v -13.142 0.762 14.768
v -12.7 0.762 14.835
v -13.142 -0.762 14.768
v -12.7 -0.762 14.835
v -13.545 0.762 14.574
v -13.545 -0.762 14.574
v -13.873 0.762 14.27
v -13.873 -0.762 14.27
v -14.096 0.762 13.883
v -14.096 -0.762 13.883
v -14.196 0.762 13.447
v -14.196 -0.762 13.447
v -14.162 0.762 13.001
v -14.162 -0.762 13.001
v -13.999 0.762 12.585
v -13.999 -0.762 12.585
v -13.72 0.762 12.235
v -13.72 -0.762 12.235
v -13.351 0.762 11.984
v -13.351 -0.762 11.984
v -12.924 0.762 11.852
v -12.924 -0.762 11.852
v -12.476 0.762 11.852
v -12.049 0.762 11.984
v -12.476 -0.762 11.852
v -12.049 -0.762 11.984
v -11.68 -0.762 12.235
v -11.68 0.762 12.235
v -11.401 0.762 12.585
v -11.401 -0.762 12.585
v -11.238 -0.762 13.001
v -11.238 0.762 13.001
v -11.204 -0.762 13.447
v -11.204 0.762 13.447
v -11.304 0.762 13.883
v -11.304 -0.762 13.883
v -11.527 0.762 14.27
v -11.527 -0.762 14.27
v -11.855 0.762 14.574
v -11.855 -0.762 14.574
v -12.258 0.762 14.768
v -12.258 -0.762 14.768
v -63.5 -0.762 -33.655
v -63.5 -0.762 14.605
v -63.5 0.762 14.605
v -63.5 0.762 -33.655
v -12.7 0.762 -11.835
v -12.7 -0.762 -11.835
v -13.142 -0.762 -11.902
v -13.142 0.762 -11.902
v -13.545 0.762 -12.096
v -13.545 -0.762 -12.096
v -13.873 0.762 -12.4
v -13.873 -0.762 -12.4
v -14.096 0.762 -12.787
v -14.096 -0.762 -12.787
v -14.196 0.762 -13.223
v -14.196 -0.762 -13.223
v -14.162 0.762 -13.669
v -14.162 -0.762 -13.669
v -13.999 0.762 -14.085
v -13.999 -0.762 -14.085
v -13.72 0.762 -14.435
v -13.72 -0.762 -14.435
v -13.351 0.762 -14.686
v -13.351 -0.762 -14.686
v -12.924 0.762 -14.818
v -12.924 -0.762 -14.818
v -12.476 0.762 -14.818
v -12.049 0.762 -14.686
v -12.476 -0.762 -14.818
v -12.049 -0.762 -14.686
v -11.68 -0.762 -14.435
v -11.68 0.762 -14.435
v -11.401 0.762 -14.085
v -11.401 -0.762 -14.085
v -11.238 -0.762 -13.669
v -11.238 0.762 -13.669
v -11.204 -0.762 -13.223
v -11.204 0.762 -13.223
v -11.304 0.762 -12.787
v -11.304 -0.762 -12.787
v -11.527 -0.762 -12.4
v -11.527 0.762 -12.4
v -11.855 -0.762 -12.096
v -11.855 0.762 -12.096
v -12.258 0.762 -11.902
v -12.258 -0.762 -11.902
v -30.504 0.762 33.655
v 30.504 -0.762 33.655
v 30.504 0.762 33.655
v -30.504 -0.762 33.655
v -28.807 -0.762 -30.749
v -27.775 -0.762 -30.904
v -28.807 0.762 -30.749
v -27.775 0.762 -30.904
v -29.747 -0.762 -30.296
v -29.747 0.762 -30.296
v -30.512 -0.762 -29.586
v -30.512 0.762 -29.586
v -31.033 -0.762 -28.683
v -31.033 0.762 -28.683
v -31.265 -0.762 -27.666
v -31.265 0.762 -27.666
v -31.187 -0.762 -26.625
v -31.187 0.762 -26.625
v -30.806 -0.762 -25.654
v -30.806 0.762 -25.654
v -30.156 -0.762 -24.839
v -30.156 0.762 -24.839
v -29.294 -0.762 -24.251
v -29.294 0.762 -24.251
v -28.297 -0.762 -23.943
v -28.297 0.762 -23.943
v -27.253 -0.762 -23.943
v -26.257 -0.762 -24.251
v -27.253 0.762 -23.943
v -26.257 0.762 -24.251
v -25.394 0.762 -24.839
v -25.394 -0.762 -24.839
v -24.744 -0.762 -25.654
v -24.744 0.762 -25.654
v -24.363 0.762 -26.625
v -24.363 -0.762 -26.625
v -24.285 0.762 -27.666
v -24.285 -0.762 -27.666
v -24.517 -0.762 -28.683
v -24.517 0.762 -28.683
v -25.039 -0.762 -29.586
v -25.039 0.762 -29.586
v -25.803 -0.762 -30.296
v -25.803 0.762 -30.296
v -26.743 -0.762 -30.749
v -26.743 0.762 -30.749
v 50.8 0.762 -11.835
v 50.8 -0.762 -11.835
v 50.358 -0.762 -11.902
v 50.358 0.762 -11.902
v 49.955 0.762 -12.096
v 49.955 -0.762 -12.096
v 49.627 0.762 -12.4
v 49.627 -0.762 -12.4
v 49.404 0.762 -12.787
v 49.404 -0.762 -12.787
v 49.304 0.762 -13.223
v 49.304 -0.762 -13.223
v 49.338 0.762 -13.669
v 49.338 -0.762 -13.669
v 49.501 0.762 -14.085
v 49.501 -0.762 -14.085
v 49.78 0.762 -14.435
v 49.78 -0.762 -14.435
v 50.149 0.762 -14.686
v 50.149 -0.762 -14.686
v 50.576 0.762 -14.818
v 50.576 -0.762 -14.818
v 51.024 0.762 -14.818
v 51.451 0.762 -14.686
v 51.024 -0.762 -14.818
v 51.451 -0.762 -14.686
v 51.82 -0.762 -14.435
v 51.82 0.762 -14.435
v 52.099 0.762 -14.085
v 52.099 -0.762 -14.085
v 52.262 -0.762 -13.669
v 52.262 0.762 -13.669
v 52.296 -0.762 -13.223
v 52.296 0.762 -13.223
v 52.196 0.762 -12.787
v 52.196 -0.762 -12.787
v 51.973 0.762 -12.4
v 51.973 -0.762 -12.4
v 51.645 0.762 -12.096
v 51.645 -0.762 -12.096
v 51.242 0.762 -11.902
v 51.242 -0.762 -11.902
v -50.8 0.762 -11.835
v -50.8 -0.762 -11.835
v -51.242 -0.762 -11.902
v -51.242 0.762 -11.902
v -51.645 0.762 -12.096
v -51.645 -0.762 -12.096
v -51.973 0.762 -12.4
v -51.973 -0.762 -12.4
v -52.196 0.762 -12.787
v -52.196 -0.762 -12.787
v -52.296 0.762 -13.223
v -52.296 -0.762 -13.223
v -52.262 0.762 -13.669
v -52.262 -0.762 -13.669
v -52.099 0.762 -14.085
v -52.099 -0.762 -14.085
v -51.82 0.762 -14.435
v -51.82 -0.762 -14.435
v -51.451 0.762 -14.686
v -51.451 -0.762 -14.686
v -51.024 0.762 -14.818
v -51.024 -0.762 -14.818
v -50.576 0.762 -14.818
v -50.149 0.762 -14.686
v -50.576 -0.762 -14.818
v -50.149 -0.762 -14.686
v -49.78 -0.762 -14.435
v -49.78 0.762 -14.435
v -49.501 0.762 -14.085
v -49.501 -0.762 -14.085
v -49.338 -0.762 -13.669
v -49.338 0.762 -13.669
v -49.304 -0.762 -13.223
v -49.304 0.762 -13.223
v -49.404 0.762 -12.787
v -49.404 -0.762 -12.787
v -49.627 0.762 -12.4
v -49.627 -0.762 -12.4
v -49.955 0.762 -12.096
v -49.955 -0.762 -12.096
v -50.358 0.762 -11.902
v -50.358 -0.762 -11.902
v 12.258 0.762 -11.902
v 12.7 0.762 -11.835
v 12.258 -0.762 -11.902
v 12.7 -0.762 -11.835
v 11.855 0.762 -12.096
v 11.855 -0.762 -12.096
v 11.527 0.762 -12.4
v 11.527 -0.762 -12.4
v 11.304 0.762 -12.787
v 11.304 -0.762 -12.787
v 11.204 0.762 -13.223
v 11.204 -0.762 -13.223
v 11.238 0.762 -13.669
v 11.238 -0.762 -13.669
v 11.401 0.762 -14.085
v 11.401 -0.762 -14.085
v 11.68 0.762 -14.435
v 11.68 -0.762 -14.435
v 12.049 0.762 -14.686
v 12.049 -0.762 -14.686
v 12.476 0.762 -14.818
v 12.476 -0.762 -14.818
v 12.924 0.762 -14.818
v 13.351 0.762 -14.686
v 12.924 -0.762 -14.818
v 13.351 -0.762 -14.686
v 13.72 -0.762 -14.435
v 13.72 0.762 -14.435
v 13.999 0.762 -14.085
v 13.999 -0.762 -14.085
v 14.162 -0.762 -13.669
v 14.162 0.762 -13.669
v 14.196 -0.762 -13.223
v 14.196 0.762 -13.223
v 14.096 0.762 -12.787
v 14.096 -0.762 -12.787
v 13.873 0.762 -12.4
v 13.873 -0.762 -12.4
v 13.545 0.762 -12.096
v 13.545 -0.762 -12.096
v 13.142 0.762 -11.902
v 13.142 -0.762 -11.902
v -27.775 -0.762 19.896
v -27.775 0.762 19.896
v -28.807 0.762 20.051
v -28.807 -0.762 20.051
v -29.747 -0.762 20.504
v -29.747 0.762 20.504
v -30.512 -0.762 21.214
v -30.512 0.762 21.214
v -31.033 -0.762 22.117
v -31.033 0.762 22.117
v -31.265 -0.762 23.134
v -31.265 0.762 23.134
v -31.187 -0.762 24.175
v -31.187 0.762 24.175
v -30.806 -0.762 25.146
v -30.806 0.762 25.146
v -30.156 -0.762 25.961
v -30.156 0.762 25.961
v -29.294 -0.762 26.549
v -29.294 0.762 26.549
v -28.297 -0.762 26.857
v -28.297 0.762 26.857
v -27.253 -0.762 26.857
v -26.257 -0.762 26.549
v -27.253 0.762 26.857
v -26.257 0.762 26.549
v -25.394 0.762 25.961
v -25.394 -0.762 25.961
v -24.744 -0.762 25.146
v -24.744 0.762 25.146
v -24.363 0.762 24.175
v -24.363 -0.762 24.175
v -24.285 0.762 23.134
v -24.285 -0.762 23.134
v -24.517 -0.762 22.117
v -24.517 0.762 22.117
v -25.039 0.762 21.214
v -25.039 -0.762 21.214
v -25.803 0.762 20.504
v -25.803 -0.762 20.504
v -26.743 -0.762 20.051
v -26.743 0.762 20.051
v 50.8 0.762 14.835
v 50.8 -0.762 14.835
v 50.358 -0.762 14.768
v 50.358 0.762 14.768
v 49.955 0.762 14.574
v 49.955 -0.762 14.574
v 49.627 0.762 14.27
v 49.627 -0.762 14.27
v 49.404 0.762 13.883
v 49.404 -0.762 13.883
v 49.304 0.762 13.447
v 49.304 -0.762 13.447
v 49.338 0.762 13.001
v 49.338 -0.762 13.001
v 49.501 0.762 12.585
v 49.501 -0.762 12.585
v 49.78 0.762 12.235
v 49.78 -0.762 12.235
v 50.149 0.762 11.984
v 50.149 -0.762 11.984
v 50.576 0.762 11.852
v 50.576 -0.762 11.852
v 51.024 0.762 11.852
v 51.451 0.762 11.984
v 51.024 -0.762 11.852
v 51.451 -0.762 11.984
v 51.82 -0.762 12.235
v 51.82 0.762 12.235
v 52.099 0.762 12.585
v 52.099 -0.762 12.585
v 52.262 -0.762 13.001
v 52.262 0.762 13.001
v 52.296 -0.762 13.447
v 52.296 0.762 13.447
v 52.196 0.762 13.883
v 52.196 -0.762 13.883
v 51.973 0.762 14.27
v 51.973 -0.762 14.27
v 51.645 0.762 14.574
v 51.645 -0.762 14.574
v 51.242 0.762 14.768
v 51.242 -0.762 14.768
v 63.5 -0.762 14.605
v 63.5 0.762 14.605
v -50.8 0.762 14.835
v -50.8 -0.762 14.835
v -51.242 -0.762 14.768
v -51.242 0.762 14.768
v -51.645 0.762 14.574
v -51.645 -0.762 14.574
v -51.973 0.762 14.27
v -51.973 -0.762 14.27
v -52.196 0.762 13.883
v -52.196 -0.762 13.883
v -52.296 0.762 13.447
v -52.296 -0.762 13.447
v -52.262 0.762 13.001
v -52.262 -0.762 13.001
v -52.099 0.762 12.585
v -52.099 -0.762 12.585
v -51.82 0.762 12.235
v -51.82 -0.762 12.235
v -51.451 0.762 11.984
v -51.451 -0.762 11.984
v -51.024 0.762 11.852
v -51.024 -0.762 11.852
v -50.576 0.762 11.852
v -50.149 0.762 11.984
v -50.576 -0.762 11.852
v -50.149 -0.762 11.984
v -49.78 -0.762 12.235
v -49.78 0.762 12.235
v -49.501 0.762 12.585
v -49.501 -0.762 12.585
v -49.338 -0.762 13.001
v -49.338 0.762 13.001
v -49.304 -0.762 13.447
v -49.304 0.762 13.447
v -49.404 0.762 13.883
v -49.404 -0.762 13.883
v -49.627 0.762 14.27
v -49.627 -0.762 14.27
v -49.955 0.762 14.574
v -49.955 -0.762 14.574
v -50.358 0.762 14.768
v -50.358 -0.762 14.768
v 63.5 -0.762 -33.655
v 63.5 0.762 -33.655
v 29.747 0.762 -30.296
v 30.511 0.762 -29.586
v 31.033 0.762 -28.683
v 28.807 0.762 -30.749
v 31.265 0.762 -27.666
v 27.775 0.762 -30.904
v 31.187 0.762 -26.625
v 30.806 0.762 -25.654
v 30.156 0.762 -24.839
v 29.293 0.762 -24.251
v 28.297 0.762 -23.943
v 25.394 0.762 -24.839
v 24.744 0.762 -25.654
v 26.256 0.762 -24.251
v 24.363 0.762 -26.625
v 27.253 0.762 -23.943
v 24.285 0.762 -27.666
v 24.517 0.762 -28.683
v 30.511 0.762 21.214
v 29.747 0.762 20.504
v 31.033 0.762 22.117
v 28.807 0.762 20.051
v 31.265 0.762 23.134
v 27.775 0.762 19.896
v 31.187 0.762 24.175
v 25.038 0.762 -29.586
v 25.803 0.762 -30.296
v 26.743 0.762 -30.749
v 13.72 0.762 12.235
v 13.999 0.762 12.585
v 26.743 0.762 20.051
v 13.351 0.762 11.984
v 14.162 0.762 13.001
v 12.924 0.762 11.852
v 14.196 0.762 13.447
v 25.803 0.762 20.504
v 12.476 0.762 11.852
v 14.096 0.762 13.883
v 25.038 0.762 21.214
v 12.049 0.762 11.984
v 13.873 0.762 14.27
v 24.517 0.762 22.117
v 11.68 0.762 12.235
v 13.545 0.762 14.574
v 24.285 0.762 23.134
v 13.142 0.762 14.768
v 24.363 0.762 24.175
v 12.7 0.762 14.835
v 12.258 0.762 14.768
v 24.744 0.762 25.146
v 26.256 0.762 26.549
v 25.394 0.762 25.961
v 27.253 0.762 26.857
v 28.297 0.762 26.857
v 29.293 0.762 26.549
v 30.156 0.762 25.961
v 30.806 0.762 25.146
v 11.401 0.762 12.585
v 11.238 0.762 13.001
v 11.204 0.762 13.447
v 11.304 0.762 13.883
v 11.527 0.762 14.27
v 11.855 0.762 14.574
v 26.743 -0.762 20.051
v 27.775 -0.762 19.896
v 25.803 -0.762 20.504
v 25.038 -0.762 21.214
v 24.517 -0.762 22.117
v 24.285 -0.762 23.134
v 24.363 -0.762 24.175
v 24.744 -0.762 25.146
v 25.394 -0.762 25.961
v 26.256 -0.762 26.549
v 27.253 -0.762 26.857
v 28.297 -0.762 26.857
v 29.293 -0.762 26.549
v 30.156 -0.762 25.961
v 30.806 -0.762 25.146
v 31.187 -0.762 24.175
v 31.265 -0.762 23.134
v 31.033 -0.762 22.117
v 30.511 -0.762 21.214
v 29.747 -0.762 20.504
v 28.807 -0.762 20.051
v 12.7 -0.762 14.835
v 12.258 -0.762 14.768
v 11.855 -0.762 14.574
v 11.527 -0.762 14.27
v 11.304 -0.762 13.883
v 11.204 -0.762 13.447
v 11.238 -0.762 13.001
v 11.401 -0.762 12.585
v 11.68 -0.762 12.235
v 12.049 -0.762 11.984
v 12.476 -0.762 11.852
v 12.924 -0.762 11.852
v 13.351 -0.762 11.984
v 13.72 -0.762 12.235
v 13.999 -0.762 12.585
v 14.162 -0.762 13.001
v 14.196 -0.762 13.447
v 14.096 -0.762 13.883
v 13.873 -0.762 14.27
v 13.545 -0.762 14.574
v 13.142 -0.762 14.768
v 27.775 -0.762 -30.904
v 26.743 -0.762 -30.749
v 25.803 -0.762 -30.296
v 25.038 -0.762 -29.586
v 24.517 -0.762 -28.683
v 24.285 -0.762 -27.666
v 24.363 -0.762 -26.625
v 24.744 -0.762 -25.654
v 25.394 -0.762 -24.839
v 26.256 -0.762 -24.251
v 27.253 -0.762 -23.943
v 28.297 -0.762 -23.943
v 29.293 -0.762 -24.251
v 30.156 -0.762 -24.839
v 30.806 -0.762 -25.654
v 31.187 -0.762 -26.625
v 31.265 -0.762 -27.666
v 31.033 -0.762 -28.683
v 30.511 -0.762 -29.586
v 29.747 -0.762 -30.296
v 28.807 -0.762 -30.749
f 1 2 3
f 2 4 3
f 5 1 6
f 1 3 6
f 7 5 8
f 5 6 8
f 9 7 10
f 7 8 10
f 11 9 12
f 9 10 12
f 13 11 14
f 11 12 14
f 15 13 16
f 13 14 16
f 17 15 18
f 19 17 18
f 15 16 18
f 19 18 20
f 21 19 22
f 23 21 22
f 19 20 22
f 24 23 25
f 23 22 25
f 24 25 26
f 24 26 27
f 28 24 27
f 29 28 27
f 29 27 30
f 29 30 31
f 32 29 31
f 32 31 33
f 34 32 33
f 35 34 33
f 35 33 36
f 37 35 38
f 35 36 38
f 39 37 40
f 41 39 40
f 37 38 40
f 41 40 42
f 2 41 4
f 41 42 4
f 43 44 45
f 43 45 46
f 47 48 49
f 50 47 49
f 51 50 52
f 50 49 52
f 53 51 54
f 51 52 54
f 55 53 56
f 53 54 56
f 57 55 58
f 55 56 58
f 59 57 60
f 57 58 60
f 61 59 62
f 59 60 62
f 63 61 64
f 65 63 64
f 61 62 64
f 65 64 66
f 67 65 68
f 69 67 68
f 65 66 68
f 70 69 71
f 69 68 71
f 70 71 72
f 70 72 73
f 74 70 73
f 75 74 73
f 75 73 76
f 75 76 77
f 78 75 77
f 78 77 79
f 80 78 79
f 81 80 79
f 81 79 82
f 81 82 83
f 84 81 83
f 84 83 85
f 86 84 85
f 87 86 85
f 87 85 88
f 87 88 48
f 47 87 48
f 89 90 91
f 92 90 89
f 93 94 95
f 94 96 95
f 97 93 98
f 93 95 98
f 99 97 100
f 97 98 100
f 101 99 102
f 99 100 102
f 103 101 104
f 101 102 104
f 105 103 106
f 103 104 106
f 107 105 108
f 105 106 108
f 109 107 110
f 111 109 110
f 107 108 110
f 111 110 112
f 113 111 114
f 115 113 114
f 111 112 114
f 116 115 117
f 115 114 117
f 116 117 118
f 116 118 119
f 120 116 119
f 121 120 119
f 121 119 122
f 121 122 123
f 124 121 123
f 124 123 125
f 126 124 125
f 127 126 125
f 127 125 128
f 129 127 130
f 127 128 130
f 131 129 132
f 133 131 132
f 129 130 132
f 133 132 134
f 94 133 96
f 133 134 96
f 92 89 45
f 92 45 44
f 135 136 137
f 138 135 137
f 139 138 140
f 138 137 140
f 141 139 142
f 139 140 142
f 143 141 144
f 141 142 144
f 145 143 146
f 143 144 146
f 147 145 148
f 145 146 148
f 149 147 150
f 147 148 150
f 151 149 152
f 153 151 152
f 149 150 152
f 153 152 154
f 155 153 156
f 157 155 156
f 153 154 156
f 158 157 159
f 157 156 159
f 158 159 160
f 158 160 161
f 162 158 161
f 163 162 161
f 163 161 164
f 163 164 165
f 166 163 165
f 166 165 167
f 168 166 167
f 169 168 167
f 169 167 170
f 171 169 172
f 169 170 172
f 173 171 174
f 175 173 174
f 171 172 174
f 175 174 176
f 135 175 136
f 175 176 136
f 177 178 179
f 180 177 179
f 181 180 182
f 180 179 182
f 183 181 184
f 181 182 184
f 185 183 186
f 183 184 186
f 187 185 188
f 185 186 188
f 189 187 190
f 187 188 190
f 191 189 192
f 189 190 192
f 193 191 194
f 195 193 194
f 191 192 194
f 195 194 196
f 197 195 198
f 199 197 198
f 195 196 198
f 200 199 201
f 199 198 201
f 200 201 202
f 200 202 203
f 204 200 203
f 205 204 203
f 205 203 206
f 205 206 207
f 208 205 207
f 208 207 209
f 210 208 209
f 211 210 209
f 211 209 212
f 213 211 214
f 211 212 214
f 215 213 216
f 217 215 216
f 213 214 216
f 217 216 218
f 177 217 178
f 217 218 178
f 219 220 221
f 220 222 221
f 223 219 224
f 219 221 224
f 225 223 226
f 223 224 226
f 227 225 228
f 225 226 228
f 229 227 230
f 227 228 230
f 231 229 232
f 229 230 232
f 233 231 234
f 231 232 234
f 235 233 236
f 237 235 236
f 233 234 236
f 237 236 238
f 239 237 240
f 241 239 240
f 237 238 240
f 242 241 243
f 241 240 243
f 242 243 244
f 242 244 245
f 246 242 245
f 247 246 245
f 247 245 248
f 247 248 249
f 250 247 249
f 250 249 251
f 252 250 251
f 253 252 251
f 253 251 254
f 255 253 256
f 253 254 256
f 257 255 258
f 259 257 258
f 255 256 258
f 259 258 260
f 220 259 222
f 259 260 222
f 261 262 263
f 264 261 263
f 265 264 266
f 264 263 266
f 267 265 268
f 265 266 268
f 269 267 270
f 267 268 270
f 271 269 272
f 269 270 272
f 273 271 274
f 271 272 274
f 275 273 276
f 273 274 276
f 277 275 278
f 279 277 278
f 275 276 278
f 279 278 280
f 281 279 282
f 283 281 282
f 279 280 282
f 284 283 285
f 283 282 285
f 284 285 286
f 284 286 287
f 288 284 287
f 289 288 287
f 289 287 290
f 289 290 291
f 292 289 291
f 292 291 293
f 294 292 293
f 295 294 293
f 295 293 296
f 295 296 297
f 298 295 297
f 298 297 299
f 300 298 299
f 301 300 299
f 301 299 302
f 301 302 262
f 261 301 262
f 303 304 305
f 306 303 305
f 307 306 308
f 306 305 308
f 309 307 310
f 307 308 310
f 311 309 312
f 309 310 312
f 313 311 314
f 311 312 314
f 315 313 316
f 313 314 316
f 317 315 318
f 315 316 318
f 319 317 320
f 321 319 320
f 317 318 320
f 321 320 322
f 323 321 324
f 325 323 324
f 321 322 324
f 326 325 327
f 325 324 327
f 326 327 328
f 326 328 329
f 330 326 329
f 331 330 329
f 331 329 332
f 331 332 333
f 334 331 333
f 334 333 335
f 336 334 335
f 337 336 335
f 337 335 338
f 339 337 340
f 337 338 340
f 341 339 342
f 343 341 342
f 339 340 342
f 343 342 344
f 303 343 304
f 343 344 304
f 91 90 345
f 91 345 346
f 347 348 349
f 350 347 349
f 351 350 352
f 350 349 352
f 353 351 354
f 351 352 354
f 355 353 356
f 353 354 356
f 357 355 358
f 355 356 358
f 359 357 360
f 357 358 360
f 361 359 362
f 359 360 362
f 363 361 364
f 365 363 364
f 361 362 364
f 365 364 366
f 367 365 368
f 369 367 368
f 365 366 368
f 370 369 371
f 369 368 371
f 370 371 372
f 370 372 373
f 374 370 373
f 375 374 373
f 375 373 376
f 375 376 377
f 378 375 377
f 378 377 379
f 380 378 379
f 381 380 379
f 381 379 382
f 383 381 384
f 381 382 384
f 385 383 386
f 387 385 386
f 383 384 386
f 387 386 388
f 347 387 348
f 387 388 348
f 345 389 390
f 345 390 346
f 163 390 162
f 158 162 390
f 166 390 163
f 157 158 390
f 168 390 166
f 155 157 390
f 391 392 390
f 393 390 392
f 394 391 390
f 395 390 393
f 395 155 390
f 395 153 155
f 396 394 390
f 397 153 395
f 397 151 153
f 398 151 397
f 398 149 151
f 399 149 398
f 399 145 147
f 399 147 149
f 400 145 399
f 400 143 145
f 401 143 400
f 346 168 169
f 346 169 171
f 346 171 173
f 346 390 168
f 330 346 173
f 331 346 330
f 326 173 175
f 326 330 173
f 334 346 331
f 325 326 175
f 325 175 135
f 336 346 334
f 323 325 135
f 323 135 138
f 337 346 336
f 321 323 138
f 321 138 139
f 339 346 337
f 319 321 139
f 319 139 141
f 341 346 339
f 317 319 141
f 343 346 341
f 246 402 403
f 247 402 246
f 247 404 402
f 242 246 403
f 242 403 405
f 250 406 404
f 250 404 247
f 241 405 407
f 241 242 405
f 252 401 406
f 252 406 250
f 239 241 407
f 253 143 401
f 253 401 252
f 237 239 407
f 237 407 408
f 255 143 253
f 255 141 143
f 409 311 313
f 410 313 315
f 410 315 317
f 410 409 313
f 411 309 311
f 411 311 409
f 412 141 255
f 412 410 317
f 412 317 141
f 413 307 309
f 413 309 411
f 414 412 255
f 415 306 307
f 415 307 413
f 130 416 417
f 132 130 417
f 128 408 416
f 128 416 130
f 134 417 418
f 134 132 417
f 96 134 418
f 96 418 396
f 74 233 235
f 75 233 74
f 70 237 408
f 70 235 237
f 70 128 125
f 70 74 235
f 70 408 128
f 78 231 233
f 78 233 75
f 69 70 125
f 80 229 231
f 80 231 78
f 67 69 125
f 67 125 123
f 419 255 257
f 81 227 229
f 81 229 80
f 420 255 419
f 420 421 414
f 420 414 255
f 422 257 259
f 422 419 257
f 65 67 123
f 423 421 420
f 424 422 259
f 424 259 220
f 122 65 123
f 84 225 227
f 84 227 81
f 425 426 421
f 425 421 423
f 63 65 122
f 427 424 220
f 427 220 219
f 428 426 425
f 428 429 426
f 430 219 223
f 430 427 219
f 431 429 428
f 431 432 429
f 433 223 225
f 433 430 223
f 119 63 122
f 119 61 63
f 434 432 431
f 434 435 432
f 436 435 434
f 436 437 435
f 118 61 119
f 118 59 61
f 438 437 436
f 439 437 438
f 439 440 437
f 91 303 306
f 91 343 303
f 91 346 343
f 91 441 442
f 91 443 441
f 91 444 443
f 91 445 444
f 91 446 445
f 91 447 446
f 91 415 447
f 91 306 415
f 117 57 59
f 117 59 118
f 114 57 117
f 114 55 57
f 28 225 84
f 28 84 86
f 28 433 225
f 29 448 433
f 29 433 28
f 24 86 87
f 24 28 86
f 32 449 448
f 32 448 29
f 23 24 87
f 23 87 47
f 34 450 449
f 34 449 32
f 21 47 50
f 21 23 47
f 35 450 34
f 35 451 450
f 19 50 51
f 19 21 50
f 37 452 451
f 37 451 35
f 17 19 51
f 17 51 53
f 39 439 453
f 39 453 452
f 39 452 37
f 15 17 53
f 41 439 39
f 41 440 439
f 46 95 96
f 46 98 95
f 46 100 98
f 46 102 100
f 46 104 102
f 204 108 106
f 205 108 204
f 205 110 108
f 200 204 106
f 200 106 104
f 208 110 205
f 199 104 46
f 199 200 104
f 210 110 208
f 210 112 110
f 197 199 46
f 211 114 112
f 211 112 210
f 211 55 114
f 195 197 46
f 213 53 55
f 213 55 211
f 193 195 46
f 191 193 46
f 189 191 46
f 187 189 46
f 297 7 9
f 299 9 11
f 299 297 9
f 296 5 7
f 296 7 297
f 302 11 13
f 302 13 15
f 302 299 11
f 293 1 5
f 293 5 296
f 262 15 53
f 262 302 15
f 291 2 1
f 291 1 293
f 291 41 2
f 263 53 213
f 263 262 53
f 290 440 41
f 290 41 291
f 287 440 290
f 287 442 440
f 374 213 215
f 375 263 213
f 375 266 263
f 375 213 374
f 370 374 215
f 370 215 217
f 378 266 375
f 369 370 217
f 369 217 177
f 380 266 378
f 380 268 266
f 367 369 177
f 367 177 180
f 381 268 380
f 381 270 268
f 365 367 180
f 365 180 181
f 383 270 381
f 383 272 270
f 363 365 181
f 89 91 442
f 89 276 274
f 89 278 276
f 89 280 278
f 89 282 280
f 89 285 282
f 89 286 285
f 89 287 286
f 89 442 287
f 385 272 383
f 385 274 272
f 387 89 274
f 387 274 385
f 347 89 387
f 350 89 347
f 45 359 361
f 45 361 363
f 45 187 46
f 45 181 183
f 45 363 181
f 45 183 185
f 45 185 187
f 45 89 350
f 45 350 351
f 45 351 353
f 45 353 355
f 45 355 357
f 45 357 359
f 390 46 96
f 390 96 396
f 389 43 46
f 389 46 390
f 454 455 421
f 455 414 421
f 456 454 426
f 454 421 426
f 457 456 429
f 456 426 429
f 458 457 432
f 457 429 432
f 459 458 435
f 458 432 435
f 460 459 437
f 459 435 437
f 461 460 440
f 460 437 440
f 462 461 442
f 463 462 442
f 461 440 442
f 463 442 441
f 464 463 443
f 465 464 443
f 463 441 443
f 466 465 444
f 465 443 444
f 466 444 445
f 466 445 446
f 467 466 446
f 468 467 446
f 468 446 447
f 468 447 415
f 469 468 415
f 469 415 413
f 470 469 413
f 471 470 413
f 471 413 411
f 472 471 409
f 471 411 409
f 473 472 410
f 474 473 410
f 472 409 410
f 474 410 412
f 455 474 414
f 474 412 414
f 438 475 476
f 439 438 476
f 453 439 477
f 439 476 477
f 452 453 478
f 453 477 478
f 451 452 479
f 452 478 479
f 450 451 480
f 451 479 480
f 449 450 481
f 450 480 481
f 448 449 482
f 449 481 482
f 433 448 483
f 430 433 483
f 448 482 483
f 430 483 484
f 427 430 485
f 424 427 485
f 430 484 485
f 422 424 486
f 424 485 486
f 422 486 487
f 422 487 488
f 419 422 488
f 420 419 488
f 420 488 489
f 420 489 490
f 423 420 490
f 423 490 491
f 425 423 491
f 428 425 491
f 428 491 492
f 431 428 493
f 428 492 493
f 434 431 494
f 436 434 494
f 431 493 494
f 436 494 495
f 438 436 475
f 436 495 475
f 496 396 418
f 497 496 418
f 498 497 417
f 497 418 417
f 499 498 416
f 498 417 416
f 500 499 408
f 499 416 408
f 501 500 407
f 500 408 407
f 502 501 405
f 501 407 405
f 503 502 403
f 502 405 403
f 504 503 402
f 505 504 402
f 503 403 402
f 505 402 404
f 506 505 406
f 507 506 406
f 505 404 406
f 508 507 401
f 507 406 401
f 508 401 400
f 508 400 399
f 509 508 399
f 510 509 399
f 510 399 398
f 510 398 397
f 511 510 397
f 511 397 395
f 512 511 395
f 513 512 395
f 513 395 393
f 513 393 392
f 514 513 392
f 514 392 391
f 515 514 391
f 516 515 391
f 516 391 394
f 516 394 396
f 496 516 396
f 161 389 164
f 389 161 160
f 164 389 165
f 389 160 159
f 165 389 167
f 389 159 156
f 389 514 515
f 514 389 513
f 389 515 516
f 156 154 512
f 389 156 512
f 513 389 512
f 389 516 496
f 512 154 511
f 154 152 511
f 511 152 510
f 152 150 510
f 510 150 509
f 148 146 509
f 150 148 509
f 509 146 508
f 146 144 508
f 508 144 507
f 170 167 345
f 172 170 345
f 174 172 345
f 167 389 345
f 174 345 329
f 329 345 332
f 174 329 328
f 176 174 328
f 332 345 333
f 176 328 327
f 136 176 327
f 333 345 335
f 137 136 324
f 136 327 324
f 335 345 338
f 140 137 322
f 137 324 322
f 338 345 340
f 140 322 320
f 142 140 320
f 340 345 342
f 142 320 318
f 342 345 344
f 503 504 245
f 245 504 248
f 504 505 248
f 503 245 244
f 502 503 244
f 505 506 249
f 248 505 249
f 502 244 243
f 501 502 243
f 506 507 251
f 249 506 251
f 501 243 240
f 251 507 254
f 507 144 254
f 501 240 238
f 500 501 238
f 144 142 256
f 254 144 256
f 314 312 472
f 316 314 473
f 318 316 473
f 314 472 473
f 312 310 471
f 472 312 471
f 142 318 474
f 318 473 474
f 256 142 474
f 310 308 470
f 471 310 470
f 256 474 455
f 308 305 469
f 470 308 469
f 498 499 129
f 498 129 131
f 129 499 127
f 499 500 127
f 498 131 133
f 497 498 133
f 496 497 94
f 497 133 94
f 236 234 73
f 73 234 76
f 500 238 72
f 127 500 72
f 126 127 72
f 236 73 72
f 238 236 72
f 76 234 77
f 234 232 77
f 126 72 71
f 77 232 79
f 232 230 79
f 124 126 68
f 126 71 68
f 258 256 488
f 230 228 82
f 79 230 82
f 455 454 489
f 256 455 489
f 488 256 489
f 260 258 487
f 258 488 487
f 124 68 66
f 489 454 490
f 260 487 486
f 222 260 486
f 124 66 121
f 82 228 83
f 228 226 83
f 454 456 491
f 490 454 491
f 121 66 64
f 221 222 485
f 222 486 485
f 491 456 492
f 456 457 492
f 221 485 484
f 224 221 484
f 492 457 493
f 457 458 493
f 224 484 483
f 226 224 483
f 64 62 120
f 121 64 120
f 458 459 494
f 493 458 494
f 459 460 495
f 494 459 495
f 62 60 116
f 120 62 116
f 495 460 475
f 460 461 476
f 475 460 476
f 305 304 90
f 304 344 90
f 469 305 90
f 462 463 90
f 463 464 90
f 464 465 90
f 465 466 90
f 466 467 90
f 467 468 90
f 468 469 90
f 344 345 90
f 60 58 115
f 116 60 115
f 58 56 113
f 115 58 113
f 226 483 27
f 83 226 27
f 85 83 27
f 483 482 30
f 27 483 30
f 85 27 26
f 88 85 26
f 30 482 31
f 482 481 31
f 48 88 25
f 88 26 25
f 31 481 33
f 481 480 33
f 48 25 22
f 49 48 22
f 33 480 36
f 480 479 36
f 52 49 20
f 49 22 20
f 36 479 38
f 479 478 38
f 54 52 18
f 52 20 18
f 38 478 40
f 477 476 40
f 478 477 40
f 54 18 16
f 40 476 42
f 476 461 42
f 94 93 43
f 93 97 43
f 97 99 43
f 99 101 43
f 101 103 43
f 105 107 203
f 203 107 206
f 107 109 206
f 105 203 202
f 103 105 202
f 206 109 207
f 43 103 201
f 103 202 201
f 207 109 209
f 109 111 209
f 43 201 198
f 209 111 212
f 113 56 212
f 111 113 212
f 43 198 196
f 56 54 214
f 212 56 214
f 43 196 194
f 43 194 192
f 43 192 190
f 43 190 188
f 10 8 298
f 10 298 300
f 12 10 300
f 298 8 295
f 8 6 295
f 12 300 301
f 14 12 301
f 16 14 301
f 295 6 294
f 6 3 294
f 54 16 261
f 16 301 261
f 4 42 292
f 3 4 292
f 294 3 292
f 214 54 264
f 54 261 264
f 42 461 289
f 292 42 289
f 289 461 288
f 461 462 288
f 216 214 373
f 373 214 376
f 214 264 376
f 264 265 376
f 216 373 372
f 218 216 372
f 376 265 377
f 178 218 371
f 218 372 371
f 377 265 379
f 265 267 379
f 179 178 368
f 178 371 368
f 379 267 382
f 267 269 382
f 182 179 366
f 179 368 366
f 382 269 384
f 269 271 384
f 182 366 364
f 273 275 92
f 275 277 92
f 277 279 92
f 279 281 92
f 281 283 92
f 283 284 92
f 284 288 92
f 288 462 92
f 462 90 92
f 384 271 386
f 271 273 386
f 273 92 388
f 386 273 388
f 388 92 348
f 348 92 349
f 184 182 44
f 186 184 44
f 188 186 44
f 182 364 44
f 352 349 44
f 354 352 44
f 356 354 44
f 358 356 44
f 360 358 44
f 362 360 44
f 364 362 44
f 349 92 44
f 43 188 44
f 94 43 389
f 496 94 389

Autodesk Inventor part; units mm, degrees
ref_plane "YZ Plane" through (0, 0, 0) normal (1, 0, 0) x (0, 1, 0)
ref_plane "XZ Plane" through (0, 0, 0) normal (0, 1, 0) x (-1, 0, 0)
ref_plane "XY Plane" through (0, 0, 0) normal (0, 0, 1) x (1, 0, 0)
sketch "Sketch1" plane through (0, 0, 0) normal (0, 1, 0) x (-1, 0, 0)
  line L0 (-63.5, 33.655) -> (63.5, 33.655)
  line L1 (63.5, 33.655) -> (63.5, -33.655)
  line L2 (63.5, -33.655) -> (-63.5, -33.655)
  line L3 (-63.5, -33.655) -> (-63.5, 33.655)
  line L4 (-63.5, 33.655) -> (63.5, -33.655) construction
  line L5 (63.5, 33.655) -> (-63.5, -33.655) construction
  point P0 (0, 0)
  dimension "d0" = 127
  dimension "d1" = 67.31
extrude "Extrusion1" add sketch "Sketch1" along normal mid plane 1.524
sketch "Sketch2" plane through (0, 0.762, 0) normal (0, 1, 0) x (1, 0, 0)
  line L0 (63.5, 33.655) -> (-63.5, 33.655) projected
  line L1 (-63.5, -33.655) -> (63.5, -33.655) projected
  line L2 (-63.5, 33.655) -> (-63.5, -33.655) projected
  line L3 (63.5, -33.655) -> (63.5, 33.655) projected
  point P0 (0, 0)
  point P1 (-50.8, 13.335)
  point P2 (-12.7, 13.335)
  point P3 (12.7, 13.335)
  point P4 (50.8, 13.335)
  point P5 (50.8, -13.335)
  point P6 (12.7, -13.335)
  point P7 (-12.7, -13.335)
  point P8 (-50.8, -13.335)
  point P9 (-50.8, -33.655)
  point P10 (50.8, -33.655)
  point P11 (-63.5, -20.955)
  point P12 (63.5, -20.955)
  dimension "d5" = 20.32
  dimension "d6" = 20.32
  dimension "d7" = 12.7
  dimension "d8" = 50.8
  dimension "d9" = 12.7
  dimension "d10" = 50.8
hole "Hole1" at (-50.8, 0.762, -13.335) at (-12.7, 0.762, -13.335) at (12.7, 0.762, -13.335) at (50.8, 0.762, -13.335) at (50.8, 0.762, 13.335) at (12.7, 0.762, 13.335) at (-12.7, 0.762, 13.335) at (-50.8, 0.762, 13.335) direction (0, -1, 0) diameter 3 depth 25.4 tip angle 118
chamfer "Chamfer1" distance 19.05 angle 60 1 edges at (-63.5, 0, 33.655) measured on face at (-63.5, -0.254, 11.2183)
sketch "Sketch4" plane through (0, -0.762, 0) normal (0, -1, 0) x (1, 0, 0)
  circle A0 centre (-27.7751, -27.4042) radius 1.7018
  circle A1 centre (-27.7751, 23.3958) radius 1.7018
  circle A2 centre (27.7749, 23.3958) radius 1.7018
  circle A3 centre (27.7749, -27.4042) radius 1.7018
  point P0 (0, 0)
hole "Hole3" at (-27.7751, -0.762, -27.4042) at (-27.7751, -0.762, 23.3958) at (27.7749, -0.762, 23.3958) at (27.7749, -0.762, -27.4042) direction (0, 1, 0) diameter 7 end through all
chamfer "Chamfer2" distance 19.05 angle 60 1 edges at (63.5, 0, 33.655) measured on face at (63.5, 0.254, 11.2183)
equation "\"d6\" = d5"
equation "\"d9\" = d7"
equation "\"d10\" = d8"
properties part number "DPLX_P023 Spark Gap Shielding Bottom" material "Polyethylene, High Density"
